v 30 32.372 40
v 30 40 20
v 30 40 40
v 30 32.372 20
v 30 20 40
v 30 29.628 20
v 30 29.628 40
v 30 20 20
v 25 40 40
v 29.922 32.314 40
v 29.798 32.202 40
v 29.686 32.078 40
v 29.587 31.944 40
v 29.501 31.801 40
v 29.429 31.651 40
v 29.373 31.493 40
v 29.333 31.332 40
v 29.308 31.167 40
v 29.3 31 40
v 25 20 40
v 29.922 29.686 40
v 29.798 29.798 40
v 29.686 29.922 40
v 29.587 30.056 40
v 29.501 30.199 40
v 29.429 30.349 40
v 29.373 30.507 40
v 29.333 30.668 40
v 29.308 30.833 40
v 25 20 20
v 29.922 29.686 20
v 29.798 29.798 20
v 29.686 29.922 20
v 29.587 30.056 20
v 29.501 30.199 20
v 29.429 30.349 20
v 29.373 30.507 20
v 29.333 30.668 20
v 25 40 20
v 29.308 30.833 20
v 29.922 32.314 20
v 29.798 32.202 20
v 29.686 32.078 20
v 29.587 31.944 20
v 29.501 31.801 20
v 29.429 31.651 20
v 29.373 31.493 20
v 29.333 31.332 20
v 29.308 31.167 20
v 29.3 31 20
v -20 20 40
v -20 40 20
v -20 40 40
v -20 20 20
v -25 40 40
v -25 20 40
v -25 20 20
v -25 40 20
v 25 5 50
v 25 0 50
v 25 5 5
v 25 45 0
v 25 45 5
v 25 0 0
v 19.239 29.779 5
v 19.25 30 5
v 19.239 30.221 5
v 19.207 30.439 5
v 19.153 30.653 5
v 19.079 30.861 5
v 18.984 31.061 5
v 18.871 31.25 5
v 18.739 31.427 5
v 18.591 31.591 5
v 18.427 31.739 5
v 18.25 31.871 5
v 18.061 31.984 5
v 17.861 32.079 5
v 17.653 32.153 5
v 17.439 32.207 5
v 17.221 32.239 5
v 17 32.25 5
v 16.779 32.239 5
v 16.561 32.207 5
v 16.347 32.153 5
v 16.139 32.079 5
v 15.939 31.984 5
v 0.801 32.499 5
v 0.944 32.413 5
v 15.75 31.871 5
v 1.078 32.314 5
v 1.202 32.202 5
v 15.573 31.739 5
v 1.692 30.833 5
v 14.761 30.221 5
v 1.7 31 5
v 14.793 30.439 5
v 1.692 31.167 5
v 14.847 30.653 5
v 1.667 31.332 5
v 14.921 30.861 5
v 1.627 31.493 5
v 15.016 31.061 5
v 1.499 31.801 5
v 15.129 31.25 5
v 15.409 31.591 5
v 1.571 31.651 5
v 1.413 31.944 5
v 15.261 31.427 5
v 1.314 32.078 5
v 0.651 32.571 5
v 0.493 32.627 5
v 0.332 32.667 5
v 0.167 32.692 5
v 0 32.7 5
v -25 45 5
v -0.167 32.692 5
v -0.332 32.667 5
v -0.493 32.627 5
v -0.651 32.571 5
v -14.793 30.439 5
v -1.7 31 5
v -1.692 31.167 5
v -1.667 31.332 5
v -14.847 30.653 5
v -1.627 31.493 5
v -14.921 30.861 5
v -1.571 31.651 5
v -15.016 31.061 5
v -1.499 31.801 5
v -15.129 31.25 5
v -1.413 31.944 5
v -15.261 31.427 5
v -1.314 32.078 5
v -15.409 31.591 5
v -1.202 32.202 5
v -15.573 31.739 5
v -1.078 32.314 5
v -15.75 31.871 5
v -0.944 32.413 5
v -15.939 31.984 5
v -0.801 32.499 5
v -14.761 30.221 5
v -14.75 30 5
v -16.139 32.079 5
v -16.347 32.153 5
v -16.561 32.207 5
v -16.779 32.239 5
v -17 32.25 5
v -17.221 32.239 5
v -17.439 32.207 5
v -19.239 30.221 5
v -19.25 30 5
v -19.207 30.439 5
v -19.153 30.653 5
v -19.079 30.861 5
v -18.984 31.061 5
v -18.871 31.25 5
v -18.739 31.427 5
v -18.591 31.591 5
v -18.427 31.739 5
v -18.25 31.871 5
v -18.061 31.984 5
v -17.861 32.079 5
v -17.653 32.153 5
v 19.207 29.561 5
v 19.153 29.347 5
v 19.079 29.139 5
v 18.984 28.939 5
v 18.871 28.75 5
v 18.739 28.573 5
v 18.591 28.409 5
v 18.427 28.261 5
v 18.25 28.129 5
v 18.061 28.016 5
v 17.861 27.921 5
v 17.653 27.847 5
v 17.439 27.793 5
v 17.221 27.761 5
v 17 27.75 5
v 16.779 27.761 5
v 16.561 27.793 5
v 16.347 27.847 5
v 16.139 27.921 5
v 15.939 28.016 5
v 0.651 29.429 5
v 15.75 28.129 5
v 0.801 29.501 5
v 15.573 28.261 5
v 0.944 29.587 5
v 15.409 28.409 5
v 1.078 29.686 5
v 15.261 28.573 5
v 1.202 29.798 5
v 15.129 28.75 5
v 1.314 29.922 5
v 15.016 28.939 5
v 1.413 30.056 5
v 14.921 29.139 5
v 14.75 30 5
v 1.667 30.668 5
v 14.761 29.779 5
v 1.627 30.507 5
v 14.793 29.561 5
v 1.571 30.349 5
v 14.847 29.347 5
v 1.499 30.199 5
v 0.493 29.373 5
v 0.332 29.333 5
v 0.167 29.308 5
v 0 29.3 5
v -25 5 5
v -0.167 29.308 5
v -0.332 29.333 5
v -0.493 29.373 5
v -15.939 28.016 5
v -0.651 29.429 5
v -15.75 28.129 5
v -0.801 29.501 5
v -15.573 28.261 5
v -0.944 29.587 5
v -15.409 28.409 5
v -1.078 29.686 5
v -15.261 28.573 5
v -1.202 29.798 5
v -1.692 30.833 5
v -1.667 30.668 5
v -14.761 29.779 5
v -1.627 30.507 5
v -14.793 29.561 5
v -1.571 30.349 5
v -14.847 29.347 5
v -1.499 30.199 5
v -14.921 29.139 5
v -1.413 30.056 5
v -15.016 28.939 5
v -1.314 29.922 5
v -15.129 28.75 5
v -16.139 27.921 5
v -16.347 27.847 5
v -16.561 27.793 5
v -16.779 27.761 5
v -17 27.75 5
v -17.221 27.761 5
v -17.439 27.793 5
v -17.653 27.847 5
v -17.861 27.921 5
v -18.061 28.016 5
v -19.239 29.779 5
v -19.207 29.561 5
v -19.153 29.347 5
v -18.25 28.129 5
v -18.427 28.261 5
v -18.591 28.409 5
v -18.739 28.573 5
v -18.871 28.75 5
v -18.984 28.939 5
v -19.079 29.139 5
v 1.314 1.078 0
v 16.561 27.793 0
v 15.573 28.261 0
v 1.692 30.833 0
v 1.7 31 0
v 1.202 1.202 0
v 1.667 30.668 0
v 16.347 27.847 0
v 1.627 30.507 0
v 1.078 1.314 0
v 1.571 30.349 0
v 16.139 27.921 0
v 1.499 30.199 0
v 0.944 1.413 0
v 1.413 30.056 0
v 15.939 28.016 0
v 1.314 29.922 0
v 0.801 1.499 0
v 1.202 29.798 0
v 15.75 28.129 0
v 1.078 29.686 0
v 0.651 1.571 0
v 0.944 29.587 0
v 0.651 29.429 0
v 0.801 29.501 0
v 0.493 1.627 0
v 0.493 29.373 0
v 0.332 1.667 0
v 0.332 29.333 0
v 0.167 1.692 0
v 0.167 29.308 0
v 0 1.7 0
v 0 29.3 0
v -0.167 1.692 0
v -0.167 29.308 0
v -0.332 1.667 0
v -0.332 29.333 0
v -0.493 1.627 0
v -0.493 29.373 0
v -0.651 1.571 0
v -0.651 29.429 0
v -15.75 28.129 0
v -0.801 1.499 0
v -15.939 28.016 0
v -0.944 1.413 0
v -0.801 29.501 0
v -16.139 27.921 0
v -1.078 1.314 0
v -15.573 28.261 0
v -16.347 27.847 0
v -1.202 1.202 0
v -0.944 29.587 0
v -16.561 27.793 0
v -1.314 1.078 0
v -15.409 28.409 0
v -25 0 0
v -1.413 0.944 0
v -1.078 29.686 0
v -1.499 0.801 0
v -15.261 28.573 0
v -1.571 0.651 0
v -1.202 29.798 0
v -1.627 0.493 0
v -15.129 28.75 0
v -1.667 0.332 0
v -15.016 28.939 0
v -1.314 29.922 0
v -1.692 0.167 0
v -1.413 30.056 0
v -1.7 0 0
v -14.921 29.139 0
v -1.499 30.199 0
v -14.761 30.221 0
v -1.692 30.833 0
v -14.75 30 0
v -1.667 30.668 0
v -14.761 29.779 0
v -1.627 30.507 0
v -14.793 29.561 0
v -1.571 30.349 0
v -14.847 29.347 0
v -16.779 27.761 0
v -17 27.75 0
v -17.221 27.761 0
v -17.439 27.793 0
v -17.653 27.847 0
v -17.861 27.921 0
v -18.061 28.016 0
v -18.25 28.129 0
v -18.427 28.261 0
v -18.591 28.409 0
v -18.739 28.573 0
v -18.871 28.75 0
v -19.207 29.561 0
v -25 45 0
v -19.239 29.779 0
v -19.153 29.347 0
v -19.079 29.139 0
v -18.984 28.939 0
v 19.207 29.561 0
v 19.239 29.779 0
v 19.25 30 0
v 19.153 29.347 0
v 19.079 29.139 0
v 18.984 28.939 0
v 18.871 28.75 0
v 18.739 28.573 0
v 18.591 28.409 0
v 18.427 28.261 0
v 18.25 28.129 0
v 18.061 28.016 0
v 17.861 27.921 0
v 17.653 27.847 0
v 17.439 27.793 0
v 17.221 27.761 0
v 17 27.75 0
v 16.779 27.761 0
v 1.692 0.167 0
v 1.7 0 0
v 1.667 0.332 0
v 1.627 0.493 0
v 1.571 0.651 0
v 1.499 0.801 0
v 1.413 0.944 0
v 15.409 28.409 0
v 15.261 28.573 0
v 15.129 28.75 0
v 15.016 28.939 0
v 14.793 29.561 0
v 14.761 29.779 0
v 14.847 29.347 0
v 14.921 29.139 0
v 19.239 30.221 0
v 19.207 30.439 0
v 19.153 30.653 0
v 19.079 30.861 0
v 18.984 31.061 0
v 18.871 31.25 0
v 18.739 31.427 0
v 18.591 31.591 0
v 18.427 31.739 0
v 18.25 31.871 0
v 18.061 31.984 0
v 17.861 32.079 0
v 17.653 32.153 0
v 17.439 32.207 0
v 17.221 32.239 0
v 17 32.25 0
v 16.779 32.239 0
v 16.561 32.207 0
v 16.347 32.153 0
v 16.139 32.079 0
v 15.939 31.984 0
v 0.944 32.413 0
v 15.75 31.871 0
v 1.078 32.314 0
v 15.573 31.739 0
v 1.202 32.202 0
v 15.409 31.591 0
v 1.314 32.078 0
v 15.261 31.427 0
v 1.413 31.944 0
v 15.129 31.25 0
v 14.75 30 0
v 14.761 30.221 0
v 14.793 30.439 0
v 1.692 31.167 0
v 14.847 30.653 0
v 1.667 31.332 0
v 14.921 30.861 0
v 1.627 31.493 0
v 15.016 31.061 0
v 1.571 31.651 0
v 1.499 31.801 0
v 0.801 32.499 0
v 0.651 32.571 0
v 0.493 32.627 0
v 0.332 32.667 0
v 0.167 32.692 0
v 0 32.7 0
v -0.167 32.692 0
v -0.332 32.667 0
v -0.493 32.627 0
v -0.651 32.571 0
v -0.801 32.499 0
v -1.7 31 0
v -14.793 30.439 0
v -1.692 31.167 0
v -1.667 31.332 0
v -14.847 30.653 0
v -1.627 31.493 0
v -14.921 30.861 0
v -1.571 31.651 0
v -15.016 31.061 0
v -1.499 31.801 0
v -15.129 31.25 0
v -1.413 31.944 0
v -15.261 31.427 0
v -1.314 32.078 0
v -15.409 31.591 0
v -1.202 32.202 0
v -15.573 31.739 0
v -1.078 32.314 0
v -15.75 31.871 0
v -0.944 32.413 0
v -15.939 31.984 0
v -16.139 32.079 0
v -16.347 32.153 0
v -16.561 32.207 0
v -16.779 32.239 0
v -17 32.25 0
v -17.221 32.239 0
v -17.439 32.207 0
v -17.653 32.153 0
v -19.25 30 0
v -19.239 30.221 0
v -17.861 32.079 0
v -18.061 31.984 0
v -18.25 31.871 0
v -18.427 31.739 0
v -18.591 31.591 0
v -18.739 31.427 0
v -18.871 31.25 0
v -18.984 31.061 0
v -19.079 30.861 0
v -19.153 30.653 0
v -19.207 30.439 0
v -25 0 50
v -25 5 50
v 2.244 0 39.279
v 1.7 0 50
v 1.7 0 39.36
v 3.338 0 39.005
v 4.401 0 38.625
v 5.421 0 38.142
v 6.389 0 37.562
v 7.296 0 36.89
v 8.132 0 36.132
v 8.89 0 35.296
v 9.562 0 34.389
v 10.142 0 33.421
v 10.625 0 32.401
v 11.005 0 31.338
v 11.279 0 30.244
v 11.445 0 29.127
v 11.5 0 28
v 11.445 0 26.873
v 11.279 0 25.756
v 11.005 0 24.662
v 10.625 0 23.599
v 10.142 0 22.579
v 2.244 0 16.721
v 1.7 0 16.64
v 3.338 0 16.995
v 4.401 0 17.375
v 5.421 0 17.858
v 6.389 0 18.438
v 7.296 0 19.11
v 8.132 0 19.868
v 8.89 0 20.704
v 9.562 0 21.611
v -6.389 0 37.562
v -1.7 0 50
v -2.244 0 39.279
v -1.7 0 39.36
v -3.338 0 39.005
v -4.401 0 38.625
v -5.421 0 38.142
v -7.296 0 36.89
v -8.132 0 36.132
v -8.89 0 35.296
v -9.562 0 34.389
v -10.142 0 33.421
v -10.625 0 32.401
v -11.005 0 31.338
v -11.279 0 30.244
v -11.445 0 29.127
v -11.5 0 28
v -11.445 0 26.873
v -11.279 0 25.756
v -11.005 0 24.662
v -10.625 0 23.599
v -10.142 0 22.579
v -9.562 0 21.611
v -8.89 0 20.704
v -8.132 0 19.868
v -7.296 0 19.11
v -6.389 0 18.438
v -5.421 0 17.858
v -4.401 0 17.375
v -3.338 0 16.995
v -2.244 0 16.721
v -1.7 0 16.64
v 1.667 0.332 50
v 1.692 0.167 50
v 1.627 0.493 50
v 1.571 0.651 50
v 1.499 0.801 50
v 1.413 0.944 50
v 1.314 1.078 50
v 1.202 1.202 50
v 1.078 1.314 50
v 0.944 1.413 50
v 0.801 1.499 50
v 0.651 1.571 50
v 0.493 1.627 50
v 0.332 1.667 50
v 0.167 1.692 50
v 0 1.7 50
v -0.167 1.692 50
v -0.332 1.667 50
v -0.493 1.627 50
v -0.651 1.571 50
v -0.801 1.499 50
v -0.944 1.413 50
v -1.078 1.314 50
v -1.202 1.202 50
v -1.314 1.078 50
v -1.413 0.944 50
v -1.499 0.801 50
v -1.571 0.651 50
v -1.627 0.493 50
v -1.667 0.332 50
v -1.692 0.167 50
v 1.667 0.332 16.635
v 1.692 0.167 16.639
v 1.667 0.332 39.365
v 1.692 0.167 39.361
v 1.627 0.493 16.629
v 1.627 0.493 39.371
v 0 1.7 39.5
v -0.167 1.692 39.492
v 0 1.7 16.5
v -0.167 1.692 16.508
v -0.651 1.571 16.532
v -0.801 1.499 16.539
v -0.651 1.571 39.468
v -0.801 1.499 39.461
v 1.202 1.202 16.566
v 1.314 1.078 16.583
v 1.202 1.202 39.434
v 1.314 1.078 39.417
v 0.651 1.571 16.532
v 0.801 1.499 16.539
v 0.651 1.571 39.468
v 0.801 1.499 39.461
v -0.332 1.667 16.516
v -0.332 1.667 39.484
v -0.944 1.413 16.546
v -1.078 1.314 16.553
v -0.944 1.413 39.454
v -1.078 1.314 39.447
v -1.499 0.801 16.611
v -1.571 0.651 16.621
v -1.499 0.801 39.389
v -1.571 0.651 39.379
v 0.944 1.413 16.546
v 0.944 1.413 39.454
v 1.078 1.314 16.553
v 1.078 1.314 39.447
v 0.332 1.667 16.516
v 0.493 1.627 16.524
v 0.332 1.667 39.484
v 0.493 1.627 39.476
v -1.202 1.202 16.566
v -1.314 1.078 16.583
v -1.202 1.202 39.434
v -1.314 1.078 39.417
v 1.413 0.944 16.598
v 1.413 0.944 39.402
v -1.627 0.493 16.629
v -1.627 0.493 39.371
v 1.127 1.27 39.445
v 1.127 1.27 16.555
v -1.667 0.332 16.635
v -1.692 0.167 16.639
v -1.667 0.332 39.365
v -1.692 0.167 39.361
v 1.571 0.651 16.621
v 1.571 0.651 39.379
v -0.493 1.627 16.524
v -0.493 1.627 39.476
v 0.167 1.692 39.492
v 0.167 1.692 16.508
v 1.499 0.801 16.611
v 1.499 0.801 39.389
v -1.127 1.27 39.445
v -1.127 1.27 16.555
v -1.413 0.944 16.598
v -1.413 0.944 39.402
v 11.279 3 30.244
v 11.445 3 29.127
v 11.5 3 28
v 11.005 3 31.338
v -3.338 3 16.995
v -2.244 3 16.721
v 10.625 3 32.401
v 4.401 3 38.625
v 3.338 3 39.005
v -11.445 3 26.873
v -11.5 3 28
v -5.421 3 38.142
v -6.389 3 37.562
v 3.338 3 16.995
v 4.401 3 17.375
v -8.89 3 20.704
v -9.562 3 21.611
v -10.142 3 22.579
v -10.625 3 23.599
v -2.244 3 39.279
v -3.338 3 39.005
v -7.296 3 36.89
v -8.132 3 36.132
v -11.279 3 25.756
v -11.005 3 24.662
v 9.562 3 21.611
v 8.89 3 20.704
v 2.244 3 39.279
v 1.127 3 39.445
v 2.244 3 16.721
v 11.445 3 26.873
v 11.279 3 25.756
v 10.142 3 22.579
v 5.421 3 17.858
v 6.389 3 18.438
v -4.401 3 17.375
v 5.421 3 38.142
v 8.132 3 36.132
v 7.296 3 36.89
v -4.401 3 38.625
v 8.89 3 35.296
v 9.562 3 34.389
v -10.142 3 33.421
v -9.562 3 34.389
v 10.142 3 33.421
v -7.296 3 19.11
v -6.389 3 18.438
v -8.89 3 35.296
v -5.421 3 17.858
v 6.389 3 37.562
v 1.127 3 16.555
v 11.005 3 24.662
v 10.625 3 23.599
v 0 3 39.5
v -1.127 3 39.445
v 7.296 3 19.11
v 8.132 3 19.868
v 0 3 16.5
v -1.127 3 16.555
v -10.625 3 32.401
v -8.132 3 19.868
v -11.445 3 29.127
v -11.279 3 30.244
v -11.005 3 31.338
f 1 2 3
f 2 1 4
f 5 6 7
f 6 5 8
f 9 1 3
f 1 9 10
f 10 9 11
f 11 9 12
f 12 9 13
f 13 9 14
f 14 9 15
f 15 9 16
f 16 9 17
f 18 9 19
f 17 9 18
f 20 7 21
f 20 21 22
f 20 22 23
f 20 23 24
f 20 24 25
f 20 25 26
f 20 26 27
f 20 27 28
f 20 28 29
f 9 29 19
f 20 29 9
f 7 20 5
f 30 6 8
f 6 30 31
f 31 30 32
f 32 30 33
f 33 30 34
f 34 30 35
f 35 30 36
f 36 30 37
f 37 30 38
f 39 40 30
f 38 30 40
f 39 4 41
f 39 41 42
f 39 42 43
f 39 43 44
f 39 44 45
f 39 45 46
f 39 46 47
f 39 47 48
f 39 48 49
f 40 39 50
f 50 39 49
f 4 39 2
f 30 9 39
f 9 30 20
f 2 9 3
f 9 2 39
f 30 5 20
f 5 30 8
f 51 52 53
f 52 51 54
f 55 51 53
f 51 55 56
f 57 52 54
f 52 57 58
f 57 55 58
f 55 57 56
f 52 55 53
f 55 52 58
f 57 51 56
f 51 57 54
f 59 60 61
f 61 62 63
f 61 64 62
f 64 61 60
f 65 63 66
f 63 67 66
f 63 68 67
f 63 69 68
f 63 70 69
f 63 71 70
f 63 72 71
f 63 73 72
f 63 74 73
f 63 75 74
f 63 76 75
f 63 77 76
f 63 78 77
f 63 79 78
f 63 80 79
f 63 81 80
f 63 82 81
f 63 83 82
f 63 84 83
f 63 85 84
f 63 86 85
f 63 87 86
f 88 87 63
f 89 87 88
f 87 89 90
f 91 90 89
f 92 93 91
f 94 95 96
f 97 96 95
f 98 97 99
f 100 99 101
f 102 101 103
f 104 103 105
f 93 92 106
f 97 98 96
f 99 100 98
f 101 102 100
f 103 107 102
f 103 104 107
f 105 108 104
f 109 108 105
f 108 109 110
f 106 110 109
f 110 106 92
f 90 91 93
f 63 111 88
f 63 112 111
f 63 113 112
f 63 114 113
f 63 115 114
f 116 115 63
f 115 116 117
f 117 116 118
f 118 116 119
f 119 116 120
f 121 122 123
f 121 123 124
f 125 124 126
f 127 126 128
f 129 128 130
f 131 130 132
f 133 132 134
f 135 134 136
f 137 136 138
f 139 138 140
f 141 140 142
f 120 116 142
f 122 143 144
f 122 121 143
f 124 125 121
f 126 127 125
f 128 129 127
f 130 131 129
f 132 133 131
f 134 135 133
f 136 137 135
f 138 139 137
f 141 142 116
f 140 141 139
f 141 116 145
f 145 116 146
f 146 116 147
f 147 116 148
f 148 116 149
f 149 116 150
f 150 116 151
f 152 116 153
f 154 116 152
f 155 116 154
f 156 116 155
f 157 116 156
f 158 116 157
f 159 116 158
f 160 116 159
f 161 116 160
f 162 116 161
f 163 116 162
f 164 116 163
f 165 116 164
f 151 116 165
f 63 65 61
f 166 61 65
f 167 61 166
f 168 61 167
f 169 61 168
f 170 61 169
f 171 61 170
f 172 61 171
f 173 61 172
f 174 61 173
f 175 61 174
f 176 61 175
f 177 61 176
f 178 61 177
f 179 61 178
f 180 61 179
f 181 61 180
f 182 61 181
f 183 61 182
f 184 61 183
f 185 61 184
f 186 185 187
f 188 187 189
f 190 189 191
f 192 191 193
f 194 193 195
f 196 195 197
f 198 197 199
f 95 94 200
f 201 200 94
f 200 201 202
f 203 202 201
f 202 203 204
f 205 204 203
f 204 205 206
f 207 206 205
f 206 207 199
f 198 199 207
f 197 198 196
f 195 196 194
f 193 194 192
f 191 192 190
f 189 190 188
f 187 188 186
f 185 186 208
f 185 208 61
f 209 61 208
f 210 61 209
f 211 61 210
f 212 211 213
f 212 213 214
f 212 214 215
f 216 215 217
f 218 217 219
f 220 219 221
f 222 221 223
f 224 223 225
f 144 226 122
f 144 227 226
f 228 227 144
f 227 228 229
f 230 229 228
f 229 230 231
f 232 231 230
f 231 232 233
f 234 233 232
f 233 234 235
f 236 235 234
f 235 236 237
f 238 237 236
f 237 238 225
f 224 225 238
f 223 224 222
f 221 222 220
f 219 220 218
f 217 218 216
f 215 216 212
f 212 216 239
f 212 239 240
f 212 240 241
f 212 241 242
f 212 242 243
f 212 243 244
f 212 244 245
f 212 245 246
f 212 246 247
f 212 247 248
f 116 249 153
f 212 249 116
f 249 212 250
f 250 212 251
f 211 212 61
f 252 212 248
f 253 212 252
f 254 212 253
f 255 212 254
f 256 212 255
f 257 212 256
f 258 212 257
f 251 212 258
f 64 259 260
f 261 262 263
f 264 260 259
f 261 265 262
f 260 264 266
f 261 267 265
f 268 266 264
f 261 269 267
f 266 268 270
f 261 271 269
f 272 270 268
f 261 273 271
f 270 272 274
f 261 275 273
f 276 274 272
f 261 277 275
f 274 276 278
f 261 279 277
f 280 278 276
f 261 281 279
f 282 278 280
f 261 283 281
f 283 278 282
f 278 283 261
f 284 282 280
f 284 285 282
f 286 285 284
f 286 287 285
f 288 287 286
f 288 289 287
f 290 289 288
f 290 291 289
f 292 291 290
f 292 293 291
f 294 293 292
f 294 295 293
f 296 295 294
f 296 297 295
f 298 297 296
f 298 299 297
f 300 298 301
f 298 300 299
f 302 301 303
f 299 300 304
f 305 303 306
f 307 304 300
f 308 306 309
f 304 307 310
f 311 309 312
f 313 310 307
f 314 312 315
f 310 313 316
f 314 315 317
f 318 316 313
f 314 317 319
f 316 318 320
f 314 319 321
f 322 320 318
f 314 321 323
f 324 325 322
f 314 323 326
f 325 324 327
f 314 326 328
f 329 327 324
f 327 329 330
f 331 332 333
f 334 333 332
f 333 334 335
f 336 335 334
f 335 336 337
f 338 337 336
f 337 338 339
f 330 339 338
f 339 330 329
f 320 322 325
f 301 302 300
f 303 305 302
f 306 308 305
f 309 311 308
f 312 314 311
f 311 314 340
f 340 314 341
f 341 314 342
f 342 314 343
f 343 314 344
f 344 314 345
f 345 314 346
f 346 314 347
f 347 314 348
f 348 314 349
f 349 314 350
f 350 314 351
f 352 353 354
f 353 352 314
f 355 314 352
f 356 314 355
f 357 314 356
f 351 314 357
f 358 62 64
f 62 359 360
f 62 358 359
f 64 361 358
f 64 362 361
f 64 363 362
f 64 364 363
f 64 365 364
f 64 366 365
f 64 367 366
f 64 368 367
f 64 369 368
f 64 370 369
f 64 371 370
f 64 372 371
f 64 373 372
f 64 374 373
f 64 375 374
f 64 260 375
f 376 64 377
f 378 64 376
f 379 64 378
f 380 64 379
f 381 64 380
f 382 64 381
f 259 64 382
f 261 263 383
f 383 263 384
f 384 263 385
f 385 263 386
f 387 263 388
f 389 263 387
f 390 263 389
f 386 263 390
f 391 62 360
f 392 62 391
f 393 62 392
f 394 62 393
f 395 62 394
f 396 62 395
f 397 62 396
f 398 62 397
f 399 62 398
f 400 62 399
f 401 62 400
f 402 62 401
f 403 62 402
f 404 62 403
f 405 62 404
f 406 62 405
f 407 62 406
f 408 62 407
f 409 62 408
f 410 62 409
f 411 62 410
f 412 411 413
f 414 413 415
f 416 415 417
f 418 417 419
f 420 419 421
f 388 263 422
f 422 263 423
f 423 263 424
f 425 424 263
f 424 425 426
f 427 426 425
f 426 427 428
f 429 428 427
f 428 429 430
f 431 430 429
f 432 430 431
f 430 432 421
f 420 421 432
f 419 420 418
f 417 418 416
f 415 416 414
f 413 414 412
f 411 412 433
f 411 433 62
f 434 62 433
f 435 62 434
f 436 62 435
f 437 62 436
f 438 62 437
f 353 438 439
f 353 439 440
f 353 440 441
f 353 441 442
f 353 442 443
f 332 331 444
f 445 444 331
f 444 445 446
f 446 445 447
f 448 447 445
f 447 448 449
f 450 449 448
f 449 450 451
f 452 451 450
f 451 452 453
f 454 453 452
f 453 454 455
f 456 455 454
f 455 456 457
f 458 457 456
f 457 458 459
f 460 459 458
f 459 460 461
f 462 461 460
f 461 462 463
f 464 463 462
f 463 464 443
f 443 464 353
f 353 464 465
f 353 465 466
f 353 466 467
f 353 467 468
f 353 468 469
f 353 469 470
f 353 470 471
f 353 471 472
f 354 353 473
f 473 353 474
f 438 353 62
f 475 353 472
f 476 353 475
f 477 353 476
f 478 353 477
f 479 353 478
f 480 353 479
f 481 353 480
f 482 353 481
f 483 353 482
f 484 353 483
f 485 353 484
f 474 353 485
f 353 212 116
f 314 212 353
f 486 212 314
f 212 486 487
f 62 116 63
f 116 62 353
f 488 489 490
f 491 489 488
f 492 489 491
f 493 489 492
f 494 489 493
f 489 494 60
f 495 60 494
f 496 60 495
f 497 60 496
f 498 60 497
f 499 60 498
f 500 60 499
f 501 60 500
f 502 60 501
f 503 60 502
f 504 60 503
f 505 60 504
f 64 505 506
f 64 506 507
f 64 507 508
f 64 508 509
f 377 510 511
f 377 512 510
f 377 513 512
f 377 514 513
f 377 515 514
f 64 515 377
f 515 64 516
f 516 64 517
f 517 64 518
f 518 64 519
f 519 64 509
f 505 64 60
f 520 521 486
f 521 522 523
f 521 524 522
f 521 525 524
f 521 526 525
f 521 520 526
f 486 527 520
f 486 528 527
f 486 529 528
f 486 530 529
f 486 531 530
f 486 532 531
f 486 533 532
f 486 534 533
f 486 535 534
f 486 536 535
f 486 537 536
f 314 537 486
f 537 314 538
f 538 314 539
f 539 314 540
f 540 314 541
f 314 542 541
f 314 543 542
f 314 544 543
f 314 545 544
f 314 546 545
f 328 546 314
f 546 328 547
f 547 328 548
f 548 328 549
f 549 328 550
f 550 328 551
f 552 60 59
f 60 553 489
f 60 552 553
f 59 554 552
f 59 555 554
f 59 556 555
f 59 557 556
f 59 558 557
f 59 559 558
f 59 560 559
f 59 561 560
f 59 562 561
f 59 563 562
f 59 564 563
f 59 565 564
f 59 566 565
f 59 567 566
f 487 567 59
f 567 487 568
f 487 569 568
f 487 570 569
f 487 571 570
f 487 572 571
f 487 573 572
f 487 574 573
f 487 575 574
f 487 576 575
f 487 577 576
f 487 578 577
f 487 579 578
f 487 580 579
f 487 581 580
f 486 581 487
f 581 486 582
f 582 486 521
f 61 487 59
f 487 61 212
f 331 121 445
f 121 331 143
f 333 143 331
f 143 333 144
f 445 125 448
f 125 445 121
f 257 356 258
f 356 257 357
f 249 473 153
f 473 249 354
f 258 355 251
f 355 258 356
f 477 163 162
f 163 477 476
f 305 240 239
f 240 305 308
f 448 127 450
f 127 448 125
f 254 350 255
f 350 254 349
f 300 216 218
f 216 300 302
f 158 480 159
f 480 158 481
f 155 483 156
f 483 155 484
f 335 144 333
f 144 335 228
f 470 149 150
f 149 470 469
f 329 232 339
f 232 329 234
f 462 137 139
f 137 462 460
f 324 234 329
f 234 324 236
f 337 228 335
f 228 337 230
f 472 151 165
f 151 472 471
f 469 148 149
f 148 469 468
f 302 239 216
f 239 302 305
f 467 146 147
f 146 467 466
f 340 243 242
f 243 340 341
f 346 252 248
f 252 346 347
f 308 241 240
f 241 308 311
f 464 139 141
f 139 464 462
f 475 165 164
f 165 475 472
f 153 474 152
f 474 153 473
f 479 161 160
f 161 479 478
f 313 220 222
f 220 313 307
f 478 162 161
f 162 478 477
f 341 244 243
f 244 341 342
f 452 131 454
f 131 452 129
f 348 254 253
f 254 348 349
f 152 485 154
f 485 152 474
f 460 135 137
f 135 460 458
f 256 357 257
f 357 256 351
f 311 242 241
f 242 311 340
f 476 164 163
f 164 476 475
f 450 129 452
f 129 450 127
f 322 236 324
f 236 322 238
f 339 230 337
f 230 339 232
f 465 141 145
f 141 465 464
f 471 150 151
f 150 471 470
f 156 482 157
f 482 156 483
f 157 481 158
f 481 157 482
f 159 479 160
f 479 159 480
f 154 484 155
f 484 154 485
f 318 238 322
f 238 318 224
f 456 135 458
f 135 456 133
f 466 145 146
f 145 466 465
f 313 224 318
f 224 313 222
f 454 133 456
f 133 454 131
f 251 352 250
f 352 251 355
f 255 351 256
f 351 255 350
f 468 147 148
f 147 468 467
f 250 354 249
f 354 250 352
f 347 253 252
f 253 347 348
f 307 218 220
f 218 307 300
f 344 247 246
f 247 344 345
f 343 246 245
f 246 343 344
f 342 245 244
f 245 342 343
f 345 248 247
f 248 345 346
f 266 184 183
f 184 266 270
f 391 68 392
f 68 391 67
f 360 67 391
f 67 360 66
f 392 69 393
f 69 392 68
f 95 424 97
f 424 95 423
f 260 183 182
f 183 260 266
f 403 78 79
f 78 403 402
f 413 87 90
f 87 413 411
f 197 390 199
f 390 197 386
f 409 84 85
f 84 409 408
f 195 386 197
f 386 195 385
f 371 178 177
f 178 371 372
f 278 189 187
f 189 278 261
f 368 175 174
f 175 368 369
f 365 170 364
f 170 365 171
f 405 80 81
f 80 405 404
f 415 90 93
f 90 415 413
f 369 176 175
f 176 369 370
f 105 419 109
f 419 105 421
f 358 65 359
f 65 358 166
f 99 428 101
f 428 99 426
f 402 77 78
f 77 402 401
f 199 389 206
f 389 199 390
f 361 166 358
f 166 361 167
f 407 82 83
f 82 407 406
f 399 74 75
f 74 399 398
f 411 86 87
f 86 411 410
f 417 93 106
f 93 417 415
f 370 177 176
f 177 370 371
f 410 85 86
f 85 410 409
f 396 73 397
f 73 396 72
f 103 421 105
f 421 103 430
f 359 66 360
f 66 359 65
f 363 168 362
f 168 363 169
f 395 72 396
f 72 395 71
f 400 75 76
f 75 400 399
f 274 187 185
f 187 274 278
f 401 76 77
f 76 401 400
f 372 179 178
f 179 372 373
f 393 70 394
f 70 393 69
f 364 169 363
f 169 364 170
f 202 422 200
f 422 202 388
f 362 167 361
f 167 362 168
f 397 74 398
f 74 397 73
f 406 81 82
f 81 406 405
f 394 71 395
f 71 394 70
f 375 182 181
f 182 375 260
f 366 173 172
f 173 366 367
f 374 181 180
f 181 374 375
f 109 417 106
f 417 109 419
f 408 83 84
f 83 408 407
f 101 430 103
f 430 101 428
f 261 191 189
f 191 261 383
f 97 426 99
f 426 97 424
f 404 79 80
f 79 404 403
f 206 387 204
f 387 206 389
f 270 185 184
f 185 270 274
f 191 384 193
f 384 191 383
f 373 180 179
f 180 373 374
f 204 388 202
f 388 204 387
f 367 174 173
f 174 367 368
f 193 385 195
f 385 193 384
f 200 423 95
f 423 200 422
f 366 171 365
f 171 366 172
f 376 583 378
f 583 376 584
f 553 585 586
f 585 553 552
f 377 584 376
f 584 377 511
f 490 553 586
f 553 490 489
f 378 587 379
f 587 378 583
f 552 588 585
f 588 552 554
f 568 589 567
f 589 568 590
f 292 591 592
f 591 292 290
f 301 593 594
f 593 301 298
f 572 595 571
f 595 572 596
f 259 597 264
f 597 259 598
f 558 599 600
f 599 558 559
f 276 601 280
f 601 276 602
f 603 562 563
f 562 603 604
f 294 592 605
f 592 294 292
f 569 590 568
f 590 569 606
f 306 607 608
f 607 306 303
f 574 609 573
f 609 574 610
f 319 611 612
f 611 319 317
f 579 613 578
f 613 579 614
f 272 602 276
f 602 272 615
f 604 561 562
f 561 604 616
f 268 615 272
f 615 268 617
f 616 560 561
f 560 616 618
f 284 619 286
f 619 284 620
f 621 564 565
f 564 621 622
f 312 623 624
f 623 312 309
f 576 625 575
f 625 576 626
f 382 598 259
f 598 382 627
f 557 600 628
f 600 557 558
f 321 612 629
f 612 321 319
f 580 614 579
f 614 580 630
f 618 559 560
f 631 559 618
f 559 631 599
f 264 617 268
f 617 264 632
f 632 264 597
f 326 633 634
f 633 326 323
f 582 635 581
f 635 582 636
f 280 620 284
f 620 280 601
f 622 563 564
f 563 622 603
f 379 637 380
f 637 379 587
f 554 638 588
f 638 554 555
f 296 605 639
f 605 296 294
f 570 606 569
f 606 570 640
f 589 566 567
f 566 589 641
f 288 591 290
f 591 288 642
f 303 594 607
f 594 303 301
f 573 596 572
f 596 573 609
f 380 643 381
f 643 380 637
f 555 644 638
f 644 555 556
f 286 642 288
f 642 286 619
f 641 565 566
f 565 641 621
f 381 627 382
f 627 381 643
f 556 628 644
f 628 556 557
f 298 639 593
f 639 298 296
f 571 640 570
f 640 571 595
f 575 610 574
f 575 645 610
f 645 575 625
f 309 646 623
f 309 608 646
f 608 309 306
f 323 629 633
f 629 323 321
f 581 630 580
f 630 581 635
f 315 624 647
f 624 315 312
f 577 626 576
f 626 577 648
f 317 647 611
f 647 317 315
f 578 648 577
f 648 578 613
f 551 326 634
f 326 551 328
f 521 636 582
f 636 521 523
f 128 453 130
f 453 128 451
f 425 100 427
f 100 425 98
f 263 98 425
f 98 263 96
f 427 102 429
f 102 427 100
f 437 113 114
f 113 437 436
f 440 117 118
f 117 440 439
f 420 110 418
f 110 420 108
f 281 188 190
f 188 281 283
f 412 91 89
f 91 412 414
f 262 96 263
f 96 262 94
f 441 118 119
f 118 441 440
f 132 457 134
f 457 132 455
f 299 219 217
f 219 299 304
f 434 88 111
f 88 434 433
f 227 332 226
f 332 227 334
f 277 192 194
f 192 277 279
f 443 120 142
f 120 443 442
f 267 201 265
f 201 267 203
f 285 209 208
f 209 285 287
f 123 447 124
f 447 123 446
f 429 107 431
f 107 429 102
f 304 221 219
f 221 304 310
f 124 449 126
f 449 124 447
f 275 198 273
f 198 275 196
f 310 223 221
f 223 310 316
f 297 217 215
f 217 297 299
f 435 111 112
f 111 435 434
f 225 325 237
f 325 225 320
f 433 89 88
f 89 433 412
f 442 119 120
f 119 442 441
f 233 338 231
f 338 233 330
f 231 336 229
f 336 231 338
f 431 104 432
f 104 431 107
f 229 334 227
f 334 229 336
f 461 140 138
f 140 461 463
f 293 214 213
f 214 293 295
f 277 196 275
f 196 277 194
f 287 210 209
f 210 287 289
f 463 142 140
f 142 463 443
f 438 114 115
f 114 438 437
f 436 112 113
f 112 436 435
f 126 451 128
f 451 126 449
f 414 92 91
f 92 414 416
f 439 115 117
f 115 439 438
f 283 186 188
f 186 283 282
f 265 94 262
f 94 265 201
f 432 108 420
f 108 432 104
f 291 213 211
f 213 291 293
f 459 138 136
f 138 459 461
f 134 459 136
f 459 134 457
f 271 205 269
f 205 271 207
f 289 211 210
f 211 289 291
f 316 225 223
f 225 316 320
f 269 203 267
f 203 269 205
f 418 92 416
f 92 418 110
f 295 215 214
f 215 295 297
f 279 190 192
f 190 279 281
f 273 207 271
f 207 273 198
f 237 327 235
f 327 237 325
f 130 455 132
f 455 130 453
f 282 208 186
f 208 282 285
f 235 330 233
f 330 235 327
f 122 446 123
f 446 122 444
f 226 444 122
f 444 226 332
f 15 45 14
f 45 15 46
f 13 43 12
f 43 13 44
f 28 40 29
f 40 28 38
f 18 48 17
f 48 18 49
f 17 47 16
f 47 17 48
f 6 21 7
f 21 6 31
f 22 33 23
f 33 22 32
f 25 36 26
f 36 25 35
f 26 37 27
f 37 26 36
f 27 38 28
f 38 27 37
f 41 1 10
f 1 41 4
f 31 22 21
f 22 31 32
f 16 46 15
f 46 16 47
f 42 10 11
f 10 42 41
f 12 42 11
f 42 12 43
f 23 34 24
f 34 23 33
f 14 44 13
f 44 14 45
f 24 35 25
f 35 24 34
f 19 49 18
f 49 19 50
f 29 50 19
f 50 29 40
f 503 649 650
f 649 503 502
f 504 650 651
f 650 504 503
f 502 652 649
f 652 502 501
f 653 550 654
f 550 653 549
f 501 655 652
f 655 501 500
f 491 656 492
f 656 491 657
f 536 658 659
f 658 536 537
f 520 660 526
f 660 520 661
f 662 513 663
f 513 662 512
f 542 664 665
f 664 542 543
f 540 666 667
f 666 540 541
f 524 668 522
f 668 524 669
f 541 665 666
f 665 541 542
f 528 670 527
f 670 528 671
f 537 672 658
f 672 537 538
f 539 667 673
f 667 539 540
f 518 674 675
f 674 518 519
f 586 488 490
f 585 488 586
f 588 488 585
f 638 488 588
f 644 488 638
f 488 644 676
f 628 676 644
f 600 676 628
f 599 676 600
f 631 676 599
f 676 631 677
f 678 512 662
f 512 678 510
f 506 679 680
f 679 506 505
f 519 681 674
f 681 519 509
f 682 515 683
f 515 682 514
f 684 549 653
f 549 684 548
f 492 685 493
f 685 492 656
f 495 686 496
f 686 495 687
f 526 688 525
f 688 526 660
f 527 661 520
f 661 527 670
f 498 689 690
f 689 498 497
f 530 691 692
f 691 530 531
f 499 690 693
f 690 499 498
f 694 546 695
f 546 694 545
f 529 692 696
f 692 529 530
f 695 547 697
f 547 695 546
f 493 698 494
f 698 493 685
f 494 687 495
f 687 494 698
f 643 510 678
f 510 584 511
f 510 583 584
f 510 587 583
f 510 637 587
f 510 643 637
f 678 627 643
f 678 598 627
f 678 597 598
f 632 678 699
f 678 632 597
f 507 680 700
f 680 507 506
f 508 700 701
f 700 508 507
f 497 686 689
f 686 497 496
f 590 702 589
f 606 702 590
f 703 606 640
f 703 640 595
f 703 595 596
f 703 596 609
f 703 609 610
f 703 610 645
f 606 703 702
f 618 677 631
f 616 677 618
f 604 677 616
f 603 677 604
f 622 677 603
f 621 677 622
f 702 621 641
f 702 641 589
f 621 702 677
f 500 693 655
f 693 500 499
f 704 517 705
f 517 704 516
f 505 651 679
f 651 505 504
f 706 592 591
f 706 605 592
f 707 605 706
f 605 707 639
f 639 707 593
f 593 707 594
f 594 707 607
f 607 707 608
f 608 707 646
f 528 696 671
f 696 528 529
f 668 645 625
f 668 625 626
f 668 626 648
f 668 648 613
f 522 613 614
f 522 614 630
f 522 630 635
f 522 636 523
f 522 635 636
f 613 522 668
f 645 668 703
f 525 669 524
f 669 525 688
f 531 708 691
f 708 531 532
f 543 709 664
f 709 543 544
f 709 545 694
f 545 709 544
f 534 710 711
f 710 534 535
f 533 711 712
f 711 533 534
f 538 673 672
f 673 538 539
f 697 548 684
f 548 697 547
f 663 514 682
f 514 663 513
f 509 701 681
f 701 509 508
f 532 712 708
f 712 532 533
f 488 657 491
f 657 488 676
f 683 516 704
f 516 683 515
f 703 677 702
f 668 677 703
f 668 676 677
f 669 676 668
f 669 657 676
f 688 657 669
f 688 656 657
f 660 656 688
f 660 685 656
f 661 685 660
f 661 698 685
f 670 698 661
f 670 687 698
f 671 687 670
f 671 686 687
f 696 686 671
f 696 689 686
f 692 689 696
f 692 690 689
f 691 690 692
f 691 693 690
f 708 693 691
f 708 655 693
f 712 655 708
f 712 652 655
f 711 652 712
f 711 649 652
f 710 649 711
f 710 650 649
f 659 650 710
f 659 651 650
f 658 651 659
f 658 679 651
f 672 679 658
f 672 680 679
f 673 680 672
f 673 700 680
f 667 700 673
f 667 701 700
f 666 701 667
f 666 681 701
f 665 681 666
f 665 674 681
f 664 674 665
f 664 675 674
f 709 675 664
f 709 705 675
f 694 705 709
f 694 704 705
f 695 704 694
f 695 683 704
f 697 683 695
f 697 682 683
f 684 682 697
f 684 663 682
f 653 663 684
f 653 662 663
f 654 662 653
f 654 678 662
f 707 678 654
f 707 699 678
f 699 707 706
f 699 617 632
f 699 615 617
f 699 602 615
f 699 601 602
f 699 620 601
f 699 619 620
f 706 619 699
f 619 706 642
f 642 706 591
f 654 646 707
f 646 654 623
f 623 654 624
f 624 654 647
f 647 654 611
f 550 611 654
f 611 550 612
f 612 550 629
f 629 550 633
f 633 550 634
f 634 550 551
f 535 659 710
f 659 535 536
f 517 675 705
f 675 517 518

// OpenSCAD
// L-shaped mounting bracket for NEMA 17 stepper motor
// Print orientation: base plate on bed (z = 0), motor plate builds upward (+Z)

// ---------------- Parameters ----------------
base_x0      = -25;   // base plate x start
base_x1      = 25;    // base plate x end
base_y0      = 0;     // base plate y start
base_y1      = 45;    // base plate y end
base_z0      = 0;     // base plate z start
base_z1      = 5;     // base plate z end

hole_m4_x1   = -17;   // M4 hole 1 x position
hole_m4_y1   = 30;    // M4 hole 1 y position
hole_m4_x2   = 17;    // M4 hole 2 x position
hole_m4_y2   = 30;    // M4 hole 2 y position
hole_m4      = 4.5;   // M4 hole diameter

motor_x0     = -25;   // motor plate x start
motor_x1     = 25;    // motor plate x end
motor_y0     = 0;     // motor plate y start
motor_y1     = 5;     // motor plate y end
motor_z0     = 0;     // motor plate z start (on base top)
motor_z1     = 50;    // motor plate z end

boss_hole    = 23;    // motor centring boss hole diameter
boss_hole_x  = 0;     // boss hole centre x
boss_hole_z  = 28;    // boss hole centre z

screw_hole   = 3.4;   // M3 screw hole diameter
screw_pitch  = 31;    // square pattern side length
screw_count  = 4;     // number of screw holes

gusset_t     = 5;     // gusset thickness (X)
gusset_leg   = 20;    // right triangle leg length (Y and Z)
gusset_x0    = -25;   // left gusset x start
gusset_x1    = -20;   // left gusset x end
gusset_x2    = 20;    // right gusset x start
gusset_x3    = 25;    // right gusset x end

eps          = 0.5;   // cutter overshoot past faces

$fn = 64;

// ---------------- Model ----------------
difference() {
    union() {
        // Base plate
        translate([base_x0, base_y0, base_z0])
            cube([base_x1 - base_x0, base_y1 - base_y0, base_z1 - base_z0]);

        // Vertical motor plate, standing on the back edge of the base
        translate([motor_x0, motor_y0, motor_z0])
            cube([motor_x1 - motor_x0, motor_y1 - motor_y0, motor_z1 - motor_z0]);

        // Triangular gussets, flush with left and right edges
        for (sx = [-1, 1])
            translate([sx * gusset_x0, gusset_leg, gusset_leg])
                cube([gusset_t, gusset_leg, gusset_leg]);
    }

    // Base plate through-holes (M4)
    for (x = [hole_m4_x1, hole_m4_x2])
        for (y = [hole_m4_y1, hole_m4_y2])
            translate([x, y, -eps])
                cylinder(d = hole_m4, h = base_z1 + 2 * eps);

    // Motor plate boss hole (along Y)
    translate([boss_hole_x, 0, boss_hole_z])
        rotate([90, 0, 0])
            cylinder(d = boss_hole, h = motor_y1 - motor_y0 + 2 * eps, center = true);

    // M3 screw holes on square pattern, centred on boss hole
    for (i = [0 : screw_count - 1])
        for (j = [0 : screw_count - 1]) {
            x = -screw_pitch / 2 + (i - (screw_count - 1) / 2) * screw_pitch;
            y = -screw_pitch / 2 + (j - (screw_count - 1) / 2) * screw_pitch;
            translate([x, y, -eps])
                cylinder(d = screw_hole, h = motor_z1 - motor_z0 + 2 * eps);
        }
}
